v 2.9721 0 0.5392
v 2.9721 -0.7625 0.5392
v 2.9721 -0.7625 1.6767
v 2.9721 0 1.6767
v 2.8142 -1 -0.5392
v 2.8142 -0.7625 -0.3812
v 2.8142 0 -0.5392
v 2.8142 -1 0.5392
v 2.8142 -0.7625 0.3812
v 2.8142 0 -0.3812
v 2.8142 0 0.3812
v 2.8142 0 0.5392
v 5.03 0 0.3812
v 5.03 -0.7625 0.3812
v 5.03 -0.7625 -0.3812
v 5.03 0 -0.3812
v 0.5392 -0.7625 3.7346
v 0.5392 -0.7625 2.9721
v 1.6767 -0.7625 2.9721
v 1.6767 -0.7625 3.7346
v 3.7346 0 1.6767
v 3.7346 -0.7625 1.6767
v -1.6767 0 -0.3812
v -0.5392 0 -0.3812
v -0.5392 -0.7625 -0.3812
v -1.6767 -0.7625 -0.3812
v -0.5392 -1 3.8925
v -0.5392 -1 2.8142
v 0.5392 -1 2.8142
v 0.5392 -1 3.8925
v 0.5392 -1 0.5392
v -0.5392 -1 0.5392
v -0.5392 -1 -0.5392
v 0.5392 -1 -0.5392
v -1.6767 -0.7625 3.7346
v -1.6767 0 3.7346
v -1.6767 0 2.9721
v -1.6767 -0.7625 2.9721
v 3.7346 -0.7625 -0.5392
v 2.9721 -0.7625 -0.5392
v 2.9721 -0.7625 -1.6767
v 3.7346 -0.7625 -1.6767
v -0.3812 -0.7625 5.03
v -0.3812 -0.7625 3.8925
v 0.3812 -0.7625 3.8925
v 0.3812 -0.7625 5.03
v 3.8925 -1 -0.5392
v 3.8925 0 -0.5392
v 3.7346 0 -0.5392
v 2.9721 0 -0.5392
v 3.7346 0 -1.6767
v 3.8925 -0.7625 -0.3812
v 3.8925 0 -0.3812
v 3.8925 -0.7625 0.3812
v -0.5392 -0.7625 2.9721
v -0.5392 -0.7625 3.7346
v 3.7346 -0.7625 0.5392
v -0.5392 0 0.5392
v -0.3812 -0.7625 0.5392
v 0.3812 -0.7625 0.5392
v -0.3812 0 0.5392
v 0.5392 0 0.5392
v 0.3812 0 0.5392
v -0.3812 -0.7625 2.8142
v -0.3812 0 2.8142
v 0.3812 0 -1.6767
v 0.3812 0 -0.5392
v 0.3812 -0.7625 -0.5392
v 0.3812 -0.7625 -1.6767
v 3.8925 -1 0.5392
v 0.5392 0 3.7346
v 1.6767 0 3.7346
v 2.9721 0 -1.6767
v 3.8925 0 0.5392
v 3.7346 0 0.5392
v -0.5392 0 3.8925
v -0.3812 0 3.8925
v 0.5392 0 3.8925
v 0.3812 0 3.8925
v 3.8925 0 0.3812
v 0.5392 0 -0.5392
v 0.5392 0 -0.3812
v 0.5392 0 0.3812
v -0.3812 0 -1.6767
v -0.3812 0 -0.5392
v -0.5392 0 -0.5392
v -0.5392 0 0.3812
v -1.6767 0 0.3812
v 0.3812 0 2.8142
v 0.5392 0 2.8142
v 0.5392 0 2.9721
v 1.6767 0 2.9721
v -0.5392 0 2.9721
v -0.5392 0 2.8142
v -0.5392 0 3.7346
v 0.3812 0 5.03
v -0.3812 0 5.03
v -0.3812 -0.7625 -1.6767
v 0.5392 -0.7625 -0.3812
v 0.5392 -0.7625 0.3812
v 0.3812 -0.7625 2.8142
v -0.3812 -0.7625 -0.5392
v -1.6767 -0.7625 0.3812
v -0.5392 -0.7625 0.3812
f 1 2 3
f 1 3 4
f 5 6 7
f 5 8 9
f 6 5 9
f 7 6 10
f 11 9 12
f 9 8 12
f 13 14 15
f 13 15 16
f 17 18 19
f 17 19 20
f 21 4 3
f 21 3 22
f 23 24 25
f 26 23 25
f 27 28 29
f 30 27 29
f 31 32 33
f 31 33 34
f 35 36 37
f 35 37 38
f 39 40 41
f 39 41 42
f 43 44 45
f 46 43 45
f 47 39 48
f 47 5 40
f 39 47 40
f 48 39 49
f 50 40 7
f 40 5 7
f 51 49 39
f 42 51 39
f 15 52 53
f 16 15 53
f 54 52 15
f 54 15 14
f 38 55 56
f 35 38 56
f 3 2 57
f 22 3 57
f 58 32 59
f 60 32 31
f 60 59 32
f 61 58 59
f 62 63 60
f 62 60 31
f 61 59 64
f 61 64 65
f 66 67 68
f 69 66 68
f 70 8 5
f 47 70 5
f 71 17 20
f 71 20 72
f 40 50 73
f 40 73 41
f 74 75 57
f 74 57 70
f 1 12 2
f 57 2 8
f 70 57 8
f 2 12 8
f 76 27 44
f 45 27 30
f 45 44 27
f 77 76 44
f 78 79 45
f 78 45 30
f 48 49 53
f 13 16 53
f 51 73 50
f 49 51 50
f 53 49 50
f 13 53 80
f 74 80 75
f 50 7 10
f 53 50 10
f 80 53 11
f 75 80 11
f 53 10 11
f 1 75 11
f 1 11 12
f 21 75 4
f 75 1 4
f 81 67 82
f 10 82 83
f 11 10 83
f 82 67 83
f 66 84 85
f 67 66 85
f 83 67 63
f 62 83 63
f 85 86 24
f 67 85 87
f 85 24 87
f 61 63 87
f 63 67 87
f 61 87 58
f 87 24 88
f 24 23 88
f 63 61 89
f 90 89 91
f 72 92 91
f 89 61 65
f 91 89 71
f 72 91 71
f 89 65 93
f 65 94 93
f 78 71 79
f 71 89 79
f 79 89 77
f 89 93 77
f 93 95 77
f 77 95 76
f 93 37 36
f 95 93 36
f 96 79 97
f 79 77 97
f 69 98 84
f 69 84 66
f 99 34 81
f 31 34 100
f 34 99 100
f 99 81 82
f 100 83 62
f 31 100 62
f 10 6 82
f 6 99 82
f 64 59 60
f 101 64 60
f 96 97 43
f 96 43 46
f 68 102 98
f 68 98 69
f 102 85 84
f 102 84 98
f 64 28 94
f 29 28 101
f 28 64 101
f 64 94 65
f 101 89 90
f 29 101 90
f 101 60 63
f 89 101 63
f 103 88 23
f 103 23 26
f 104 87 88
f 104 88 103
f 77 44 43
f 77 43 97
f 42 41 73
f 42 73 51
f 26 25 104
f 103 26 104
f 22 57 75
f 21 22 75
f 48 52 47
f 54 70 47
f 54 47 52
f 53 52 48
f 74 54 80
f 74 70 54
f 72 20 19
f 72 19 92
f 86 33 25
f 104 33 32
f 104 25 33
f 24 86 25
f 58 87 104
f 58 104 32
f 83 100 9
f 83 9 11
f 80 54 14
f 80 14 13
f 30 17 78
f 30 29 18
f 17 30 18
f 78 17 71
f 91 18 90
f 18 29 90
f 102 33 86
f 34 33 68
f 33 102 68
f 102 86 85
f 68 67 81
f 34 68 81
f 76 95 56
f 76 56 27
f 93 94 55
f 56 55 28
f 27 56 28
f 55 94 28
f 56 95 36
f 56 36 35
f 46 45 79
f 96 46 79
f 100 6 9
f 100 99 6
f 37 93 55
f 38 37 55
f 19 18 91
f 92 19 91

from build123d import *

# Parameters (mm, degrees)
F0_W      = 1.07834
F0_H      = 1.07834
F1_DEPTH  = 1
F2_W      = 0.7625
F2_H      = 0.7625
F3_DEPTH  = 1.1375
F4_W      = 0.7625
F4_H      = 0.7625
F5_DEPTH  = 1.1375
F6_W      = 0.7625
F6_H      = 0.7625
F7_DEPTH  = 1.1375
F8_W      = 0.7625
F8_H      = 0.7625
F9_DEPTH  = 2.275
F11_DEPTH = 1.07834
F12_W     = 0.7625
F12_H     = 0.7625
F13_DEPTH = 1.1375
F14_W     = 0.7625
F14_H     = 0.7625
F15_DEPTH = 1.1375
F16_W     = 0.7625
F16_H     = 0.7625
F17_DEPTH = 1.1375
F18_W     = 0.7625
F18_H     = 0.7625
F19_DEPTH = 1.1375
F21_DEPTH = 1.07834
F22_W     = 0.7625
F22_H     = 0.7625
F23_DEPTH = 1.1375
F24_W     = 0.7625
F24_H     = 0.7625
F25_DEPTH = 1.1375
F26_W     = 0.7625
F26_H     = 0.7625
F27_DEPTH = 1.1375


with BuildPart() as f1:
    # F0 (on Front) → F1 (new body)
    with BuildSketch(Plane.XZ):
        Rectangle(F0_W, F0_H)
    extrude(amount=F1_DEPTH)

    # F2 (on face) → F3 (join)
    with BuildSketch(Plane(origin=(0, 0, -0.53917), x_dir=(1, 0, 0), z_dir=(0, 0, -1))):
        with Locations((0, 0.38125)):
            Rectangle(F2_W, F2_H)
    extrude(amount=F3_DEPTH)

    # F4 (on face) → F5 (join)
    with BuildSketch(Plane(origin=(-0.53917, 0, 0), x_dir=(0, -1, 0), z_dir=(-1, 0, 0))):
        with Locations((0.38125, 0)):
            Rectangle(F4_W, F4_H)
    extrude(amount=F5_DEPTH)

    # F6 (on face) → F7 (join)
    with BuildSketch(Plane.YZ.offset(0.53917)):
        with Locations((-0.38125, 0)):
            Rectangle(F6_W, F6_H)
    extrude(amount=F7_DEPTH)

    # F8 (on face) → F9 (join)
    with BuildSketch(Plane.XY.offset(0.53917)):
        with Locations((0, -0.38125)):
            Rectangle(F8_W, F8_H)
    extrude(amount=F9_DEPTH)

    # F10 (on face) → F11 (join)
    with BuildSketch(Plane.XY.offset(2.81417)):
        Polygon((0.53917, 0), (0.38125, 0), (-0.53917, 0), (-0.53917, -1), (0.53917, -1), align=None)
    extrude(amount=F11_DEPTH)

    # F12 (on face) → F13 (join)
    with BuildSketch(Plane.YZ.offset(0.53917)):
        with Locations((-0.38125, 3.35334)):
            Rectangle(F12_W, F12_H)
    extrude(amount=F13_DEPTH)

    # F14 (on face) → F15 (join)
    with BuildSketch(Plane.XY.offset(3.89251)):
        with Locations((0, -0.38125)):
            Rectangle(F14_W, F14_H)
    extrude(amount=F15_DEPTH)

    # F16 (on face) → F17 (join)
    with BuildSketch(Plane(origin=(-0.53917, 0, 0), x_dir=(0, -1, 0), z_dir=(-1, 0, 0))):
        with Locations((0.38125, 3.35334)):
            Rectangle(F16_W, F16_H)
    extrude(amount=F17_DEPTH)

    # F18 (on face) → F19 (join)
    with BuildSketch(Plane.YZ.offset(1.67667)):
        with Locations((-0.38125, 0)):
            Rectangle(F18_W, F18_H)
    extrude(amount=F19_DEPTH)

    # F20 (on face) → F21 (join)
    with BuildSketch(Plane.YZ.offset(2.81417)):
        Polygon((0, -0.53917), (0, -0.38125), (0, 0.53917), (-1, 0.53917), (-1, -0.53917), align=None)
    extrude(amount=F21_DEPTH)

    # F22 (on face) → F23 (join)
    with BuildSketch(Plane(origin=(0, 0, -0.53917), x_dir=(1, 0, 0), z_dir=(0, 0, -1))):
        with Locations((3.35334, 0.38125)):
            Rectangle(F22_W, F22_H)
    extrude(amount=F23_DEPTH)

    # F24 (on face) → F25 (join)
    with BuildSketch(Plane.YZ.offset(3.89251)):
        with Locations((-0.38125, 0)):
            Rectangle(F24_W, F24_H)
    extrude(amount=F25_DEPTH)

    # F26 (on face) → F27 (join)
    with BuildSketch(Plane.XY.offset(0.53917)):
        with Locations((3.35334, -0.38125)):
            Rectangle(F26_W, F26_H)
    extrude(amount=F27_DEPTH)


solid = f1.part
